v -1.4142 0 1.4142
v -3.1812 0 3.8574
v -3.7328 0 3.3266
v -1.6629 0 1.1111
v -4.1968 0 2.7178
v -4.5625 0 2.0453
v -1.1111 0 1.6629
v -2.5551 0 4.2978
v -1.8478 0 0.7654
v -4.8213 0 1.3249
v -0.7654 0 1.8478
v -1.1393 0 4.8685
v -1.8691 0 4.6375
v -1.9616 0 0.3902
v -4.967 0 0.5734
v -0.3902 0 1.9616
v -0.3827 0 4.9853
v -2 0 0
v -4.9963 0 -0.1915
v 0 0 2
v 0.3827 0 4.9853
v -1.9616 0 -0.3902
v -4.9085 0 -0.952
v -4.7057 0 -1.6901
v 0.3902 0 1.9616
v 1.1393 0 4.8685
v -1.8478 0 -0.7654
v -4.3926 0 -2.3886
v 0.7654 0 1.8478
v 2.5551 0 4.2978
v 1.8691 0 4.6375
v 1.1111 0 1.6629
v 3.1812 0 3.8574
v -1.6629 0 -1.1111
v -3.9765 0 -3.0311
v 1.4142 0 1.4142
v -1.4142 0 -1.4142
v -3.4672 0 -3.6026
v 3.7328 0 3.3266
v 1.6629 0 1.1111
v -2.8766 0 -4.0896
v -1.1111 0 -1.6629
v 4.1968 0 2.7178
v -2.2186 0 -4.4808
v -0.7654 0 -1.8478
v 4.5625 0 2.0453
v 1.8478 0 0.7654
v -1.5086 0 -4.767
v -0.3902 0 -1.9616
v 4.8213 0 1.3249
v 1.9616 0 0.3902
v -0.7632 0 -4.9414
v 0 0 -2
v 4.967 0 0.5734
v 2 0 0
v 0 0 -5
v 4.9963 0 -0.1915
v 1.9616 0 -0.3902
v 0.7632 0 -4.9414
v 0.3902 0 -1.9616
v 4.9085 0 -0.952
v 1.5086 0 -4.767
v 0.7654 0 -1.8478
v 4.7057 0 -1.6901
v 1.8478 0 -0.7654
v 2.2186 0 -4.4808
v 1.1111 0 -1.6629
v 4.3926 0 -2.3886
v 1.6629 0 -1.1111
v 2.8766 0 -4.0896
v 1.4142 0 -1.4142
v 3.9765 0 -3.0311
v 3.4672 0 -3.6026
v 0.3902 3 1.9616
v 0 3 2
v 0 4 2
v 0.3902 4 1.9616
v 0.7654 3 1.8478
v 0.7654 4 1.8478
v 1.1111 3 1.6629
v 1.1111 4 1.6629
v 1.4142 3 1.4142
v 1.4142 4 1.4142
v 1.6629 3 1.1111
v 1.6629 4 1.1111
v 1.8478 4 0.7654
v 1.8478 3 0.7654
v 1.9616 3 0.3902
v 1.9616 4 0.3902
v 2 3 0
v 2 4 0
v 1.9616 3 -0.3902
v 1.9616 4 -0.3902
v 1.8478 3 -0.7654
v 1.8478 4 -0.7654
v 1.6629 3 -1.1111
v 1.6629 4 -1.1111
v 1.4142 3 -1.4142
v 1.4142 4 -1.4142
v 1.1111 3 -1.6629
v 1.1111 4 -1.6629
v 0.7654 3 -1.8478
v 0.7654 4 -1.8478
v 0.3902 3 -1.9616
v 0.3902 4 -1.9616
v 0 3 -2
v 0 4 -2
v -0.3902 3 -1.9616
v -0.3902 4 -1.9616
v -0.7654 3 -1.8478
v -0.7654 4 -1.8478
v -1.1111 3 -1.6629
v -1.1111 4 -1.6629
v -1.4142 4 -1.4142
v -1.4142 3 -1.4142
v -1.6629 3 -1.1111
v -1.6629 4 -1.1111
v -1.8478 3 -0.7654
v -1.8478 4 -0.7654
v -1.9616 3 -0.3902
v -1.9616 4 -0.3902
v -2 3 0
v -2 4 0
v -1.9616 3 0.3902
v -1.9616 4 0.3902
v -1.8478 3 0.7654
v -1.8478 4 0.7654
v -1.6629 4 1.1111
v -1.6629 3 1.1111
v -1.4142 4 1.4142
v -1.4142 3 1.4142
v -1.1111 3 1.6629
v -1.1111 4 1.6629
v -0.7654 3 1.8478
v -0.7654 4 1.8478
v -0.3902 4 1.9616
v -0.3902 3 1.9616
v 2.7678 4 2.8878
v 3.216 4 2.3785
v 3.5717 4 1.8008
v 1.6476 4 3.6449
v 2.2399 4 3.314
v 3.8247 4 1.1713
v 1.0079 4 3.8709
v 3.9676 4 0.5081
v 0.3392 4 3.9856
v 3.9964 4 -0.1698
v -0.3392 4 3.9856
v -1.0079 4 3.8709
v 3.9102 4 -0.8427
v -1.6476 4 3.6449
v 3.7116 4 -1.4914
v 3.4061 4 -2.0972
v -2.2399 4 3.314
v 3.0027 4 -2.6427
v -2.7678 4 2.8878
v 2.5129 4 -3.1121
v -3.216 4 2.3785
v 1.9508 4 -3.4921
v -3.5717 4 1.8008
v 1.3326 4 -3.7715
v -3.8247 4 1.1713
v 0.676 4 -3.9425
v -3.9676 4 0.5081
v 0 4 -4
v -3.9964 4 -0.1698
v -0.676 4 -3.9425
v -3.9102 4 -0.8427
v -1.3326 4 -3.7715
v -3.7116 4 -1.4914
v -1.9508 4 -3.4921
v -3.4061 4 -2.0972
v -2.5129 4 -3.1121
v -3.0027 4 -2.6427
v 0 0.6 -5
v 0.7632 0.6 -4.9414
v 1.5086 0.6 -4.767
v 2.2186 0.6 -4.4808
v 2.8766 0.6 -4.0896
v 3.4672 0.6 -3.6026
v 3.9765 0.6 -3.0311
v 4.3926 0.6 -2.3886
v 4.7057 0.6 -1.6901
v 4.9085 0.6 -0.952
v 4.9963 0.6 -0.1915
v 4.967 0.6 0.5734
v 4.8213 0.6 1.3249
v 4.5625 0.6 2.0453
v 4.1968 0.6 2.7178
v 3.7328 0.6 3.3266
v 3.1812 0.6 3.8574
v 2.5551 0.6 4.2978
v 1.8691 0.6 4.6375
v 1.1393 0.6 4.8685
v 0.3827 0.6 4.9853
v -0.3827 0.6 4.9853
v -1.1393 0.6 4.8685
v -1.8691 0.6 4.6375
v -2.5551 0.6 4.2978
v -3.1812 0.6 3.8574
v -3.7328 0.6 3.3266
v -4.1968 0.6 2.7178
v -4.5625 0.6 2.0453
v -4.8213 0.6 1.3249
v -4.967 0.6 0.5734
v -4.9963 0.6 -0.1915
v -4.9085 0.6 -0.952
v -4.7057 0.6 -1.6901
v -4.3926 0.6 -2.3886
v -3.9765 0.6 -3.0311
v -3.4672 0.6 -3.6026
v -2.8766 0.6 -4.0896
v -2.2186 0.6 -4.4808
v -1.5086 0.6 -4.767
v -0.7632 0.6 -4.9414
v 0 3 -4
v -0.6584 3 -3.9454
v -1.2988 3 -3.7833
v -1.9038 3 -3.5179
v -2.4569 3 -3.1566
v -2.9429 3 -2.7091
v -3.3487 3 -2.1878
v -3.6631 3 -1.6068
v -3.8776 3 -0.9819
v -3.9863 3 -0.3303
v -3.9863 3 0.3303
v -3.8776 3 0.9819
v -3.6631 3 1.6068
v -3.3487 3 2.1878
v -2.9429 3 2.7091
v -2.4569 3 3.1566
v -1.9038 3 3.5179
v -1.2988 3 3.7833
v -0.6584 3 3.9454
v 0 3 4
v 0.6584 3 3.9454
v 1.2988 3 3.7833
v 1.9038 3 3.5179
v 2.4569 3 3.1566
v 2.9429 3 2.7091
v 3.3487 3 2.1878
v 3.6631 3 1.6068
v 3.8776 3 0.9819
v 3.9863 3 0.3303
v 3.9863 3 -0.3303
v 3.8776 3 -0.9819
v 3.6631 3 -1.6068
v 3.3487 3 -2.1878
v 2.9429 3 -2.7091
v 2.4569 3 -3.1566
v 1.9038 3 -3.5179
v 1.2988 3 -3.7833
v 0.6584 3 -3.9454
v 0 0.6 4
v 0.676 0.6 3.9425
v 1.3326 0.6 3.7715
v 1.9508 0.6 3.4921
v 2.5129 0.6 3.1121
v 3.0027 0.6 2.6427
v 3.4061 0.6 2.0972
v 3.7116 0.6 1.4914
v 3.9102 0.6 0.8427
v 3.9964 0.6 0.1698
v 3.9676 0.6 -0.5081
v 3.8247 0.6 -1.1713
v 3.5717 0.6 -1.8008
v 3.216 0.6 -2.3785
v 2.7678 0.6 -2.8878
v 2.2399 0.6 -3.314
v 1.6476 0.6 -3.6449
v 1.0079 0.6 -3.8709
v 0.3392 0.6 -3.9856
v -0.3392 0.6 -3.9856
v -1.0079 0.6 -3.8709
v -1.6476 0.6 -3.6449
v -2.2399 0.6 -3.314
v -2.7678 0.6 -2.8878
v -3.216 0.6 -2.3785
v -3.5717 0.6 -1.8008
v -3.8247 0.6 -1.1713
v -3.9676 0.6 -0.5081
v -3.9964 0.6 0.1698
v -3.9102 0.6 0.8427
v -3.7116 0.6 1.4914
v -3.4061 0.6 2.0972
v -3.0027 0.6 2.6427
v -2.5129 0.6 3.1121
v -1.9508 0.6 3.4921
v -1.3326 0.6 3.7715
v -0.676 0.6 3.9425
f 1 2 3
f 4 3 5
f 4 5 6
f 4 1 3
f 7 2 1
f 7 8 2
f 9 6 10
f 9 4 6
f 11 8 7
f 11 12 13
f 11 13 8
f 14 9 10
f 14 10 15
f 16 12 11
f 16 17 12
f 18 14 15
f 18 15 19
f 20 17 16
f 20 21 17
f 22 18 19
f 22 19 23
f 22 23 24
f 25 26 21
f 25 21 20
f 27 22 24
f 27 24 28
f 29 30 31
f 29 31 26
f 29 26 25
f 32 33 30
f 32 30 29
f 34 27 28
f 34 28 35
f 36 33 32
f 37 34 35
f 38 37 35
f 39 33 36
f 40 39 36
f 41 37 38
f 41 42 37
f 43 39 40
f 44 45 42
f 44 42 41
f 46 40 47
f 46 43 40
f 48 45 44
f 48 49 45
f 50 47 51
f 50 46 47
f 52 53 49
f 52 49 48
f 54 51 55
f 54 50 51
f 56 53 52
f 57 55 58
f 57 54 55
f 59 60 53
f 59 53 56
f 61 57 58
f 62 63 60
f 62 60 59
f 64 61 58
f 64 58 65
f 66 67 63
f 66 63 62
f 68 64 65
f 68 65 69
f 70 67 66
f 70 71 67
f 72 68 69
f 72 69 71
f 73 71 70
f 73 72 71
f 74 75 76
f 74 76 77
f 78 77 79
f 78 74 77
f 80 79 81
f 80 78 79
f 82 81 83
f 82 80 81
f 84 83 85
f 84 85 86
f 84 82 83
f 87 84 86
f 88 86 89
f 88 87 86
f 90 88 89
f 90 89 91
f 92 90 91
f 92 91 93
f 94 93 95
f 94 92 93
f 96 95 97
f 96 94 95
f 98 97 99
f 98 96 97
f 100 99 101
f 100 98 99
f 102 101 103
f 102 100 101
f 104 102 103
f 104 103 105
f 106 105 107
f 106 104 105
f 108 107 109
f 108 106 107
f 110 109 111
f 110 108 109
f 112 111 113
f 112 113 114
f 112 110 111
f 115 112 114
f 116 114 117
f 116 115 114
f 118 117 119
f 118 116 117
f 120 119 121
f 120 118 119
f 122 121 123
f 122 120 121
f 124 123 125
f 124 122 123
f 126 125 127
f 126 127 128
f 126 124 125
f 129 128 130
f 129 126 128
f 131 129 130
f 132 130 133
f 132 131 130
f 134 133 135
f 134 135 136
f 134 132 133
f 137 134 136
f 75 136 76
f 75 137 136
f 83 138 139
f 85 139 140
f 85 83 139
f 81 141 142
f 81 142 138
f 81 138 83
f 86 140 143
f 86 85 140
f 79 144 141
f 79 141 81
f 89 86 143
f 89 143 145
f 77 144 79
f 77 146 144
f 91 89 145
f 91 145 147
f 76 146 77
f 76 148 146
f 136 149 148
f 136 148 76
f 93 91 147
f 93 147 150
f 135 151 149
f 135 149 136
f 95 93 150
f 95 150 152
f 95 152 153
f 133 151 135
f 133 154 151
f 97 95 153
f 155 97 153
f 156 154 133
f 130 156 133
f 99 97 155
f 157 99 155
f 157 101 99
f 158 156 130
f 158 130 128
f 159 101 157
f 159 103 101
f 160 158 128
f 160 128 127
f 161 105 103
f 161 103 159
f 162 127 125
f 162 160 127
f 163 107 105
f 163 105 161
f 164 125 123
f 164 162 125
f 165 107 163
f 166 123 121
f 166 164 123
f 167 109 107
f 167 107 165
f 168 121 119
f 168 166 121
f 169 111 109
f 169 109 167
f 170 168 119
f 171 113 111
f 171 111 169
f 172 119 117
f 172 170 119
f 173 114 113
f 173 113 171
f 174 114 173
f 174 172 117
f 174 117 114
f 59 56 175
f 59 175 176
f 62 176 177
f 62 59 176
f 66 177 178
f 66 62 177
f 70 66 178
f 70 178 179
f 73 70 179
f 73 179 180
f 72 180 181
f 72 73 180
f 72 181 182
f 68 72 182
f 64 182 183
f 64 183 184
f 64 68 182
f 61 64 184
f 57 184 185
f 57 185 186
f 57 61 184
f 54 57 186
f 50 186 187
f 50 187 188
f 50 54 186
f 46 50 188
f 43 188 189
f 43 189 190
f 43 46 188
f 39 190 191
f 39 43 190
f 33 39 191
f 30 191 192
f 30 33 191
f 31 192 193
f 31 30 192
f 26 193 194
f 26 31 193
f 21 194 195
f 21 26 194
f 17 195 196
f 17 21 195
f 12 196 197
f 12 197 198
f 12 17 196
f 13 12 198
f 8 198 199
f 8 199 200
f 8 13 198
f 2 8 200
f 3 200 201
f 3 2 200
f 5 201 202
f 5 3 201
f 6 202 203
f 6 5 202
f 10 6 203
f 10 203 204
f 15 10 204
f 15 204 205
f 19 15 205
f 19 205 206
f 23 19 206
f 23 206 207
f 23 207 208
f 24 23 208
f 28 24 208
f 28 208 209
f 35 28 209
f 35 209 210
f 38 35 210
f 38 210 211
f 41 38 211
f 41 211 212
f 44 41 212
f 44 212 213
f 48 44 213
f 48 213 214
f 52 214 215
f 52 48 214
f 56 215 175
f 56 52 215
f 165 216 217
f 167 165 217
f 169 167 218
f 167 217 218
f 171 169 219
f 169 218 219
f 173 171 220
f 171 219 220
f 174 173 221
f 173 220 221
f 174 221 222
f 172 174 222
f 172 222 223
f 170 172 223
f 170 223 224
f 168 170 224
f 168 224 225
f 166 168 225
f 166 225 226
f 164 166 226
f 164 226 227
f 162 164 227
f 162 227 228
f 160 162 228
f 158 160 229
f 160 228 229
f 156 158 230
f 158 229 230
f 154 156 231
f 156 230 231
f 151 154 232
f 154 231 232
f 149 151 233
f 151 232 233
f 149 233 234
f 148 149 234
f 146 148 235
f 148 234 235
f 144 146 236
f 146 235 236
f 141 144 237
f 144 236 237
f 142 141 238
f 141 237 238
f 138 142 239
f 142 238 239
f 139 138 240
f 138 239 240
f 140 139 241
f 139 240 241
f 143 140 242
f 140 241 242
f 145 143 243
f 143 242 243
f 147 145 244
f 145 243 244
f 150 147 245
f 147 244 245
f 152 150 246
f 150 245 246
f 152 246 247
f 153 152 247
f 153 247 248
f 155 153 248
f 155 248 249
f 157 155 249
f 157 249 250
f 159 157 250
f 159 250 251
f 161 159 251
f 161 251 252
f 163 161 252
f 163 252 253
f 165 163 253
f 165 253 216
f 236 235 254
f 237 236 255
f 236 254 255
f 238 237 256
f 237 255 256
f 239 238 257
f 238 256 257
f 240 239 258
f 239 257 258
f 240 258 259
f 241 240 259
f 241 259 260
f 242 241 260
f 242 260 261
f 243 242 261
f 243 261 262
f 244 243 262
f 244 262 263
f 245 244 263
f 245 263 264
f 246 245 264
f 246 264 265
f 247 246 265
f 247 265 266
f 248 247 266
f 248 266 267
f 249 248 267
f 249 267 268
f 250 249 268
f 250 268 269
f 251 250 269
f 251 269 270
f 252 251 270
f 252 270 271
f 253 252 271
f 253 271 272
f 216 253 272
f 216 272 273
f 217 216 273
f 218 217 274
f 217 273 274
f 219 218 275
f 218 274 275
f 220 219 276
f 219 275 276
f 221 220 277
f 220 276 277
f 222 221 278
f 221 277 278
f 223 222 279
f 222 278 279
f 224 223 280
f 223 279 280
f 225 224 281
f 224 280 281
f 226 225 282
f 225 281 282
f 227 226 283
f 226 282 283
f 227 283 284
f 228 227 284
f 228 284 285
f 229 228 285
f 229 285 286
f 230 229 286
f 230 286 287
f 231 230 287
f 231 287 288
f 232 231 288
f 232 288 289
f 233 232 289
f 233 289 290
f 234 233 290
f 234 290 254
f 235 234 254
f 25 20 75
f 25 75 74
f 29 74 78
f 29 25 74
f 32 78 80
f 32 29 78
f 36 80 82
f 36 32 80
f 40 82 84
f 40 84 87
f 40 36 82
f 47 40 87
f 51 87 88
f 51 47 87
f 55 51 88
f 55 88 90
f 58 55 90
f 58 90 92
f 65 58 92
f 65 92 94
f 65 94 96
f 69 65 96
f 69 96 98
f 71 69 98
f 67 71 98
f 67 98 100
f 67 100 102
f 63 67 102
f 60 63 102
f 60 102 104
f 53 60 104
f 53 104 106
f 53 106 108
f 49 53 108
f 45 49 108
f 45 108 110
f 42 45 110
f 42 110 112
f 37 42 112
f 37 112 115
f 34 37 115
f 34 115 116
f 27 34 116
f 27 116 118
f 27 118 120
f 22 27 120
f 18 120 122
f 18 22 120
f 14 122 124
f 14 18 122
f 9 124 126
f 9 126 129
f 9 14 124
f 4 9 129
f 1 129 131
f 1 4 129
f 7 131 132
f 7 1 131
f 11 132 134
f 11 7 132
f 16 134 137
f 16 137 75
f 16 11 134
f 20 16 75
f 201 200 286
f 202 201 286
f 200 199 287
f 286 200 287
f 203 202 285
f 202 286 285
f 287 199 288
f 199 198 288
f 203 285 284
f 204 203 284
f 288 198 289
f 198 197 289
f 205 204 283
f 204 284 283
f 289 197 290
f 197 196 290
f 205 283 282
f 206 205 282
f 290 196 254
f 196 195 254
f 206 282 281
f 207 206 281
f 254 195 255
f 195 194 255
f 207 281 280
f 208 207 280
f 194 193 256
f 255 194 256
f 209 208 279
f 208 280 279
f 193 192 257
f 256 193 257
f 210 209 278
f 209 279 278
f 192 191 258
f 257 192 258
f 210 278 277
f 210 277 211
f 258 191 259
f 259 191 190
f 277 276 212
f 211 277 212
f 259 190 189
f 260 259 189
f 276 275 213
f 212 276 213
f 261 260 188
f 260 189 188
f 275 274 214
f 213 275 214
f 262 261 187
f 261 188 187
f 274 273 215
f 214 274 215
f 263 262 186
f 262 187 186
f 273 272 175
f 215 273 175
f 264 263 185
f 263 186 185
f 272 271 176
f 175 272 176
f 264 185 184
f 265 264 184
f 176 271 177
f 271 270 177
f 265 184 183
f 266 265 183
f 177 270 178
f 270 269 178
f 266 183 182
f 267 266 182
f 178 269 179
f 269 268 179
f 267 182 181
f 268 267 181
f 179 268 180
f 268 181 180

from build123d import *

# Parameters (mm, degrees)
SKETCH_1_R      = 4
SKETCH_1_R_2    = 2
EXTRUDE_1_DEPTH = 3
SKETCH_2_R      = 5
SKETCH_2_R_2    = 2
EXTRUDE_2_DEPTH = 0.6
SKETCH_3_R      = 4
SKETCH_3_R_2    = 2
EXTRUDE_3_DEPTH = 1


with BuildPart() as part:
    # 草图1 → 凸台-拉伸1 (new body)
    with BuildSketch(Plane(origin=(0, 0, 0), x_dir=(1, 0, 0), z_dir=(0, 1, 0))):
        with Locations(Location((0, 0, 0), (0, 0, 270))):
            Circle(SKETCH_1_R)
        with Locations(Location((0, 0, 0), (0, 0, 270))):
            Circle(SKETCH_1_R_2, mode=Mode.SUBTRACT)
    extrude(amount=EXTRUDE_1_DEPTH)

    # 草图2 → 凸台-拉伸2 (add)
    with BuildSketch(Plane.XZ):
        with Locations(Location((0, 0, 0), (0, 0, 270))):
            Circle(SKETCH_2_R)
        with Locations(Location((0, 0, 0), (0, 0, 90))):
            Circle(SKETCH_2_R_2, mode=Mode.SUBTRACT)
    extrude(amount=-EXTRUDE_2_DEPTH)

    # 草图3 → 凸台-拉伸3 (add)
    with BuildSketch(Plane(origin=(0, 3, 0), x_dir=(1, 0, 0), z_dir=(0, 1, 0))):
        with Locations(Location((0, 0, 0), (0, 0, 90))):
            Circle(SKETCH_3_R)
        with Locations(Location((0, 0, 0), (0, 0, 270))):
            Circle(SKETCH_3_R_2, mode=Mode.SUBTRACT)
    extrude(amount=EXTRUDE_3_DEPTH)


solid = part.part
